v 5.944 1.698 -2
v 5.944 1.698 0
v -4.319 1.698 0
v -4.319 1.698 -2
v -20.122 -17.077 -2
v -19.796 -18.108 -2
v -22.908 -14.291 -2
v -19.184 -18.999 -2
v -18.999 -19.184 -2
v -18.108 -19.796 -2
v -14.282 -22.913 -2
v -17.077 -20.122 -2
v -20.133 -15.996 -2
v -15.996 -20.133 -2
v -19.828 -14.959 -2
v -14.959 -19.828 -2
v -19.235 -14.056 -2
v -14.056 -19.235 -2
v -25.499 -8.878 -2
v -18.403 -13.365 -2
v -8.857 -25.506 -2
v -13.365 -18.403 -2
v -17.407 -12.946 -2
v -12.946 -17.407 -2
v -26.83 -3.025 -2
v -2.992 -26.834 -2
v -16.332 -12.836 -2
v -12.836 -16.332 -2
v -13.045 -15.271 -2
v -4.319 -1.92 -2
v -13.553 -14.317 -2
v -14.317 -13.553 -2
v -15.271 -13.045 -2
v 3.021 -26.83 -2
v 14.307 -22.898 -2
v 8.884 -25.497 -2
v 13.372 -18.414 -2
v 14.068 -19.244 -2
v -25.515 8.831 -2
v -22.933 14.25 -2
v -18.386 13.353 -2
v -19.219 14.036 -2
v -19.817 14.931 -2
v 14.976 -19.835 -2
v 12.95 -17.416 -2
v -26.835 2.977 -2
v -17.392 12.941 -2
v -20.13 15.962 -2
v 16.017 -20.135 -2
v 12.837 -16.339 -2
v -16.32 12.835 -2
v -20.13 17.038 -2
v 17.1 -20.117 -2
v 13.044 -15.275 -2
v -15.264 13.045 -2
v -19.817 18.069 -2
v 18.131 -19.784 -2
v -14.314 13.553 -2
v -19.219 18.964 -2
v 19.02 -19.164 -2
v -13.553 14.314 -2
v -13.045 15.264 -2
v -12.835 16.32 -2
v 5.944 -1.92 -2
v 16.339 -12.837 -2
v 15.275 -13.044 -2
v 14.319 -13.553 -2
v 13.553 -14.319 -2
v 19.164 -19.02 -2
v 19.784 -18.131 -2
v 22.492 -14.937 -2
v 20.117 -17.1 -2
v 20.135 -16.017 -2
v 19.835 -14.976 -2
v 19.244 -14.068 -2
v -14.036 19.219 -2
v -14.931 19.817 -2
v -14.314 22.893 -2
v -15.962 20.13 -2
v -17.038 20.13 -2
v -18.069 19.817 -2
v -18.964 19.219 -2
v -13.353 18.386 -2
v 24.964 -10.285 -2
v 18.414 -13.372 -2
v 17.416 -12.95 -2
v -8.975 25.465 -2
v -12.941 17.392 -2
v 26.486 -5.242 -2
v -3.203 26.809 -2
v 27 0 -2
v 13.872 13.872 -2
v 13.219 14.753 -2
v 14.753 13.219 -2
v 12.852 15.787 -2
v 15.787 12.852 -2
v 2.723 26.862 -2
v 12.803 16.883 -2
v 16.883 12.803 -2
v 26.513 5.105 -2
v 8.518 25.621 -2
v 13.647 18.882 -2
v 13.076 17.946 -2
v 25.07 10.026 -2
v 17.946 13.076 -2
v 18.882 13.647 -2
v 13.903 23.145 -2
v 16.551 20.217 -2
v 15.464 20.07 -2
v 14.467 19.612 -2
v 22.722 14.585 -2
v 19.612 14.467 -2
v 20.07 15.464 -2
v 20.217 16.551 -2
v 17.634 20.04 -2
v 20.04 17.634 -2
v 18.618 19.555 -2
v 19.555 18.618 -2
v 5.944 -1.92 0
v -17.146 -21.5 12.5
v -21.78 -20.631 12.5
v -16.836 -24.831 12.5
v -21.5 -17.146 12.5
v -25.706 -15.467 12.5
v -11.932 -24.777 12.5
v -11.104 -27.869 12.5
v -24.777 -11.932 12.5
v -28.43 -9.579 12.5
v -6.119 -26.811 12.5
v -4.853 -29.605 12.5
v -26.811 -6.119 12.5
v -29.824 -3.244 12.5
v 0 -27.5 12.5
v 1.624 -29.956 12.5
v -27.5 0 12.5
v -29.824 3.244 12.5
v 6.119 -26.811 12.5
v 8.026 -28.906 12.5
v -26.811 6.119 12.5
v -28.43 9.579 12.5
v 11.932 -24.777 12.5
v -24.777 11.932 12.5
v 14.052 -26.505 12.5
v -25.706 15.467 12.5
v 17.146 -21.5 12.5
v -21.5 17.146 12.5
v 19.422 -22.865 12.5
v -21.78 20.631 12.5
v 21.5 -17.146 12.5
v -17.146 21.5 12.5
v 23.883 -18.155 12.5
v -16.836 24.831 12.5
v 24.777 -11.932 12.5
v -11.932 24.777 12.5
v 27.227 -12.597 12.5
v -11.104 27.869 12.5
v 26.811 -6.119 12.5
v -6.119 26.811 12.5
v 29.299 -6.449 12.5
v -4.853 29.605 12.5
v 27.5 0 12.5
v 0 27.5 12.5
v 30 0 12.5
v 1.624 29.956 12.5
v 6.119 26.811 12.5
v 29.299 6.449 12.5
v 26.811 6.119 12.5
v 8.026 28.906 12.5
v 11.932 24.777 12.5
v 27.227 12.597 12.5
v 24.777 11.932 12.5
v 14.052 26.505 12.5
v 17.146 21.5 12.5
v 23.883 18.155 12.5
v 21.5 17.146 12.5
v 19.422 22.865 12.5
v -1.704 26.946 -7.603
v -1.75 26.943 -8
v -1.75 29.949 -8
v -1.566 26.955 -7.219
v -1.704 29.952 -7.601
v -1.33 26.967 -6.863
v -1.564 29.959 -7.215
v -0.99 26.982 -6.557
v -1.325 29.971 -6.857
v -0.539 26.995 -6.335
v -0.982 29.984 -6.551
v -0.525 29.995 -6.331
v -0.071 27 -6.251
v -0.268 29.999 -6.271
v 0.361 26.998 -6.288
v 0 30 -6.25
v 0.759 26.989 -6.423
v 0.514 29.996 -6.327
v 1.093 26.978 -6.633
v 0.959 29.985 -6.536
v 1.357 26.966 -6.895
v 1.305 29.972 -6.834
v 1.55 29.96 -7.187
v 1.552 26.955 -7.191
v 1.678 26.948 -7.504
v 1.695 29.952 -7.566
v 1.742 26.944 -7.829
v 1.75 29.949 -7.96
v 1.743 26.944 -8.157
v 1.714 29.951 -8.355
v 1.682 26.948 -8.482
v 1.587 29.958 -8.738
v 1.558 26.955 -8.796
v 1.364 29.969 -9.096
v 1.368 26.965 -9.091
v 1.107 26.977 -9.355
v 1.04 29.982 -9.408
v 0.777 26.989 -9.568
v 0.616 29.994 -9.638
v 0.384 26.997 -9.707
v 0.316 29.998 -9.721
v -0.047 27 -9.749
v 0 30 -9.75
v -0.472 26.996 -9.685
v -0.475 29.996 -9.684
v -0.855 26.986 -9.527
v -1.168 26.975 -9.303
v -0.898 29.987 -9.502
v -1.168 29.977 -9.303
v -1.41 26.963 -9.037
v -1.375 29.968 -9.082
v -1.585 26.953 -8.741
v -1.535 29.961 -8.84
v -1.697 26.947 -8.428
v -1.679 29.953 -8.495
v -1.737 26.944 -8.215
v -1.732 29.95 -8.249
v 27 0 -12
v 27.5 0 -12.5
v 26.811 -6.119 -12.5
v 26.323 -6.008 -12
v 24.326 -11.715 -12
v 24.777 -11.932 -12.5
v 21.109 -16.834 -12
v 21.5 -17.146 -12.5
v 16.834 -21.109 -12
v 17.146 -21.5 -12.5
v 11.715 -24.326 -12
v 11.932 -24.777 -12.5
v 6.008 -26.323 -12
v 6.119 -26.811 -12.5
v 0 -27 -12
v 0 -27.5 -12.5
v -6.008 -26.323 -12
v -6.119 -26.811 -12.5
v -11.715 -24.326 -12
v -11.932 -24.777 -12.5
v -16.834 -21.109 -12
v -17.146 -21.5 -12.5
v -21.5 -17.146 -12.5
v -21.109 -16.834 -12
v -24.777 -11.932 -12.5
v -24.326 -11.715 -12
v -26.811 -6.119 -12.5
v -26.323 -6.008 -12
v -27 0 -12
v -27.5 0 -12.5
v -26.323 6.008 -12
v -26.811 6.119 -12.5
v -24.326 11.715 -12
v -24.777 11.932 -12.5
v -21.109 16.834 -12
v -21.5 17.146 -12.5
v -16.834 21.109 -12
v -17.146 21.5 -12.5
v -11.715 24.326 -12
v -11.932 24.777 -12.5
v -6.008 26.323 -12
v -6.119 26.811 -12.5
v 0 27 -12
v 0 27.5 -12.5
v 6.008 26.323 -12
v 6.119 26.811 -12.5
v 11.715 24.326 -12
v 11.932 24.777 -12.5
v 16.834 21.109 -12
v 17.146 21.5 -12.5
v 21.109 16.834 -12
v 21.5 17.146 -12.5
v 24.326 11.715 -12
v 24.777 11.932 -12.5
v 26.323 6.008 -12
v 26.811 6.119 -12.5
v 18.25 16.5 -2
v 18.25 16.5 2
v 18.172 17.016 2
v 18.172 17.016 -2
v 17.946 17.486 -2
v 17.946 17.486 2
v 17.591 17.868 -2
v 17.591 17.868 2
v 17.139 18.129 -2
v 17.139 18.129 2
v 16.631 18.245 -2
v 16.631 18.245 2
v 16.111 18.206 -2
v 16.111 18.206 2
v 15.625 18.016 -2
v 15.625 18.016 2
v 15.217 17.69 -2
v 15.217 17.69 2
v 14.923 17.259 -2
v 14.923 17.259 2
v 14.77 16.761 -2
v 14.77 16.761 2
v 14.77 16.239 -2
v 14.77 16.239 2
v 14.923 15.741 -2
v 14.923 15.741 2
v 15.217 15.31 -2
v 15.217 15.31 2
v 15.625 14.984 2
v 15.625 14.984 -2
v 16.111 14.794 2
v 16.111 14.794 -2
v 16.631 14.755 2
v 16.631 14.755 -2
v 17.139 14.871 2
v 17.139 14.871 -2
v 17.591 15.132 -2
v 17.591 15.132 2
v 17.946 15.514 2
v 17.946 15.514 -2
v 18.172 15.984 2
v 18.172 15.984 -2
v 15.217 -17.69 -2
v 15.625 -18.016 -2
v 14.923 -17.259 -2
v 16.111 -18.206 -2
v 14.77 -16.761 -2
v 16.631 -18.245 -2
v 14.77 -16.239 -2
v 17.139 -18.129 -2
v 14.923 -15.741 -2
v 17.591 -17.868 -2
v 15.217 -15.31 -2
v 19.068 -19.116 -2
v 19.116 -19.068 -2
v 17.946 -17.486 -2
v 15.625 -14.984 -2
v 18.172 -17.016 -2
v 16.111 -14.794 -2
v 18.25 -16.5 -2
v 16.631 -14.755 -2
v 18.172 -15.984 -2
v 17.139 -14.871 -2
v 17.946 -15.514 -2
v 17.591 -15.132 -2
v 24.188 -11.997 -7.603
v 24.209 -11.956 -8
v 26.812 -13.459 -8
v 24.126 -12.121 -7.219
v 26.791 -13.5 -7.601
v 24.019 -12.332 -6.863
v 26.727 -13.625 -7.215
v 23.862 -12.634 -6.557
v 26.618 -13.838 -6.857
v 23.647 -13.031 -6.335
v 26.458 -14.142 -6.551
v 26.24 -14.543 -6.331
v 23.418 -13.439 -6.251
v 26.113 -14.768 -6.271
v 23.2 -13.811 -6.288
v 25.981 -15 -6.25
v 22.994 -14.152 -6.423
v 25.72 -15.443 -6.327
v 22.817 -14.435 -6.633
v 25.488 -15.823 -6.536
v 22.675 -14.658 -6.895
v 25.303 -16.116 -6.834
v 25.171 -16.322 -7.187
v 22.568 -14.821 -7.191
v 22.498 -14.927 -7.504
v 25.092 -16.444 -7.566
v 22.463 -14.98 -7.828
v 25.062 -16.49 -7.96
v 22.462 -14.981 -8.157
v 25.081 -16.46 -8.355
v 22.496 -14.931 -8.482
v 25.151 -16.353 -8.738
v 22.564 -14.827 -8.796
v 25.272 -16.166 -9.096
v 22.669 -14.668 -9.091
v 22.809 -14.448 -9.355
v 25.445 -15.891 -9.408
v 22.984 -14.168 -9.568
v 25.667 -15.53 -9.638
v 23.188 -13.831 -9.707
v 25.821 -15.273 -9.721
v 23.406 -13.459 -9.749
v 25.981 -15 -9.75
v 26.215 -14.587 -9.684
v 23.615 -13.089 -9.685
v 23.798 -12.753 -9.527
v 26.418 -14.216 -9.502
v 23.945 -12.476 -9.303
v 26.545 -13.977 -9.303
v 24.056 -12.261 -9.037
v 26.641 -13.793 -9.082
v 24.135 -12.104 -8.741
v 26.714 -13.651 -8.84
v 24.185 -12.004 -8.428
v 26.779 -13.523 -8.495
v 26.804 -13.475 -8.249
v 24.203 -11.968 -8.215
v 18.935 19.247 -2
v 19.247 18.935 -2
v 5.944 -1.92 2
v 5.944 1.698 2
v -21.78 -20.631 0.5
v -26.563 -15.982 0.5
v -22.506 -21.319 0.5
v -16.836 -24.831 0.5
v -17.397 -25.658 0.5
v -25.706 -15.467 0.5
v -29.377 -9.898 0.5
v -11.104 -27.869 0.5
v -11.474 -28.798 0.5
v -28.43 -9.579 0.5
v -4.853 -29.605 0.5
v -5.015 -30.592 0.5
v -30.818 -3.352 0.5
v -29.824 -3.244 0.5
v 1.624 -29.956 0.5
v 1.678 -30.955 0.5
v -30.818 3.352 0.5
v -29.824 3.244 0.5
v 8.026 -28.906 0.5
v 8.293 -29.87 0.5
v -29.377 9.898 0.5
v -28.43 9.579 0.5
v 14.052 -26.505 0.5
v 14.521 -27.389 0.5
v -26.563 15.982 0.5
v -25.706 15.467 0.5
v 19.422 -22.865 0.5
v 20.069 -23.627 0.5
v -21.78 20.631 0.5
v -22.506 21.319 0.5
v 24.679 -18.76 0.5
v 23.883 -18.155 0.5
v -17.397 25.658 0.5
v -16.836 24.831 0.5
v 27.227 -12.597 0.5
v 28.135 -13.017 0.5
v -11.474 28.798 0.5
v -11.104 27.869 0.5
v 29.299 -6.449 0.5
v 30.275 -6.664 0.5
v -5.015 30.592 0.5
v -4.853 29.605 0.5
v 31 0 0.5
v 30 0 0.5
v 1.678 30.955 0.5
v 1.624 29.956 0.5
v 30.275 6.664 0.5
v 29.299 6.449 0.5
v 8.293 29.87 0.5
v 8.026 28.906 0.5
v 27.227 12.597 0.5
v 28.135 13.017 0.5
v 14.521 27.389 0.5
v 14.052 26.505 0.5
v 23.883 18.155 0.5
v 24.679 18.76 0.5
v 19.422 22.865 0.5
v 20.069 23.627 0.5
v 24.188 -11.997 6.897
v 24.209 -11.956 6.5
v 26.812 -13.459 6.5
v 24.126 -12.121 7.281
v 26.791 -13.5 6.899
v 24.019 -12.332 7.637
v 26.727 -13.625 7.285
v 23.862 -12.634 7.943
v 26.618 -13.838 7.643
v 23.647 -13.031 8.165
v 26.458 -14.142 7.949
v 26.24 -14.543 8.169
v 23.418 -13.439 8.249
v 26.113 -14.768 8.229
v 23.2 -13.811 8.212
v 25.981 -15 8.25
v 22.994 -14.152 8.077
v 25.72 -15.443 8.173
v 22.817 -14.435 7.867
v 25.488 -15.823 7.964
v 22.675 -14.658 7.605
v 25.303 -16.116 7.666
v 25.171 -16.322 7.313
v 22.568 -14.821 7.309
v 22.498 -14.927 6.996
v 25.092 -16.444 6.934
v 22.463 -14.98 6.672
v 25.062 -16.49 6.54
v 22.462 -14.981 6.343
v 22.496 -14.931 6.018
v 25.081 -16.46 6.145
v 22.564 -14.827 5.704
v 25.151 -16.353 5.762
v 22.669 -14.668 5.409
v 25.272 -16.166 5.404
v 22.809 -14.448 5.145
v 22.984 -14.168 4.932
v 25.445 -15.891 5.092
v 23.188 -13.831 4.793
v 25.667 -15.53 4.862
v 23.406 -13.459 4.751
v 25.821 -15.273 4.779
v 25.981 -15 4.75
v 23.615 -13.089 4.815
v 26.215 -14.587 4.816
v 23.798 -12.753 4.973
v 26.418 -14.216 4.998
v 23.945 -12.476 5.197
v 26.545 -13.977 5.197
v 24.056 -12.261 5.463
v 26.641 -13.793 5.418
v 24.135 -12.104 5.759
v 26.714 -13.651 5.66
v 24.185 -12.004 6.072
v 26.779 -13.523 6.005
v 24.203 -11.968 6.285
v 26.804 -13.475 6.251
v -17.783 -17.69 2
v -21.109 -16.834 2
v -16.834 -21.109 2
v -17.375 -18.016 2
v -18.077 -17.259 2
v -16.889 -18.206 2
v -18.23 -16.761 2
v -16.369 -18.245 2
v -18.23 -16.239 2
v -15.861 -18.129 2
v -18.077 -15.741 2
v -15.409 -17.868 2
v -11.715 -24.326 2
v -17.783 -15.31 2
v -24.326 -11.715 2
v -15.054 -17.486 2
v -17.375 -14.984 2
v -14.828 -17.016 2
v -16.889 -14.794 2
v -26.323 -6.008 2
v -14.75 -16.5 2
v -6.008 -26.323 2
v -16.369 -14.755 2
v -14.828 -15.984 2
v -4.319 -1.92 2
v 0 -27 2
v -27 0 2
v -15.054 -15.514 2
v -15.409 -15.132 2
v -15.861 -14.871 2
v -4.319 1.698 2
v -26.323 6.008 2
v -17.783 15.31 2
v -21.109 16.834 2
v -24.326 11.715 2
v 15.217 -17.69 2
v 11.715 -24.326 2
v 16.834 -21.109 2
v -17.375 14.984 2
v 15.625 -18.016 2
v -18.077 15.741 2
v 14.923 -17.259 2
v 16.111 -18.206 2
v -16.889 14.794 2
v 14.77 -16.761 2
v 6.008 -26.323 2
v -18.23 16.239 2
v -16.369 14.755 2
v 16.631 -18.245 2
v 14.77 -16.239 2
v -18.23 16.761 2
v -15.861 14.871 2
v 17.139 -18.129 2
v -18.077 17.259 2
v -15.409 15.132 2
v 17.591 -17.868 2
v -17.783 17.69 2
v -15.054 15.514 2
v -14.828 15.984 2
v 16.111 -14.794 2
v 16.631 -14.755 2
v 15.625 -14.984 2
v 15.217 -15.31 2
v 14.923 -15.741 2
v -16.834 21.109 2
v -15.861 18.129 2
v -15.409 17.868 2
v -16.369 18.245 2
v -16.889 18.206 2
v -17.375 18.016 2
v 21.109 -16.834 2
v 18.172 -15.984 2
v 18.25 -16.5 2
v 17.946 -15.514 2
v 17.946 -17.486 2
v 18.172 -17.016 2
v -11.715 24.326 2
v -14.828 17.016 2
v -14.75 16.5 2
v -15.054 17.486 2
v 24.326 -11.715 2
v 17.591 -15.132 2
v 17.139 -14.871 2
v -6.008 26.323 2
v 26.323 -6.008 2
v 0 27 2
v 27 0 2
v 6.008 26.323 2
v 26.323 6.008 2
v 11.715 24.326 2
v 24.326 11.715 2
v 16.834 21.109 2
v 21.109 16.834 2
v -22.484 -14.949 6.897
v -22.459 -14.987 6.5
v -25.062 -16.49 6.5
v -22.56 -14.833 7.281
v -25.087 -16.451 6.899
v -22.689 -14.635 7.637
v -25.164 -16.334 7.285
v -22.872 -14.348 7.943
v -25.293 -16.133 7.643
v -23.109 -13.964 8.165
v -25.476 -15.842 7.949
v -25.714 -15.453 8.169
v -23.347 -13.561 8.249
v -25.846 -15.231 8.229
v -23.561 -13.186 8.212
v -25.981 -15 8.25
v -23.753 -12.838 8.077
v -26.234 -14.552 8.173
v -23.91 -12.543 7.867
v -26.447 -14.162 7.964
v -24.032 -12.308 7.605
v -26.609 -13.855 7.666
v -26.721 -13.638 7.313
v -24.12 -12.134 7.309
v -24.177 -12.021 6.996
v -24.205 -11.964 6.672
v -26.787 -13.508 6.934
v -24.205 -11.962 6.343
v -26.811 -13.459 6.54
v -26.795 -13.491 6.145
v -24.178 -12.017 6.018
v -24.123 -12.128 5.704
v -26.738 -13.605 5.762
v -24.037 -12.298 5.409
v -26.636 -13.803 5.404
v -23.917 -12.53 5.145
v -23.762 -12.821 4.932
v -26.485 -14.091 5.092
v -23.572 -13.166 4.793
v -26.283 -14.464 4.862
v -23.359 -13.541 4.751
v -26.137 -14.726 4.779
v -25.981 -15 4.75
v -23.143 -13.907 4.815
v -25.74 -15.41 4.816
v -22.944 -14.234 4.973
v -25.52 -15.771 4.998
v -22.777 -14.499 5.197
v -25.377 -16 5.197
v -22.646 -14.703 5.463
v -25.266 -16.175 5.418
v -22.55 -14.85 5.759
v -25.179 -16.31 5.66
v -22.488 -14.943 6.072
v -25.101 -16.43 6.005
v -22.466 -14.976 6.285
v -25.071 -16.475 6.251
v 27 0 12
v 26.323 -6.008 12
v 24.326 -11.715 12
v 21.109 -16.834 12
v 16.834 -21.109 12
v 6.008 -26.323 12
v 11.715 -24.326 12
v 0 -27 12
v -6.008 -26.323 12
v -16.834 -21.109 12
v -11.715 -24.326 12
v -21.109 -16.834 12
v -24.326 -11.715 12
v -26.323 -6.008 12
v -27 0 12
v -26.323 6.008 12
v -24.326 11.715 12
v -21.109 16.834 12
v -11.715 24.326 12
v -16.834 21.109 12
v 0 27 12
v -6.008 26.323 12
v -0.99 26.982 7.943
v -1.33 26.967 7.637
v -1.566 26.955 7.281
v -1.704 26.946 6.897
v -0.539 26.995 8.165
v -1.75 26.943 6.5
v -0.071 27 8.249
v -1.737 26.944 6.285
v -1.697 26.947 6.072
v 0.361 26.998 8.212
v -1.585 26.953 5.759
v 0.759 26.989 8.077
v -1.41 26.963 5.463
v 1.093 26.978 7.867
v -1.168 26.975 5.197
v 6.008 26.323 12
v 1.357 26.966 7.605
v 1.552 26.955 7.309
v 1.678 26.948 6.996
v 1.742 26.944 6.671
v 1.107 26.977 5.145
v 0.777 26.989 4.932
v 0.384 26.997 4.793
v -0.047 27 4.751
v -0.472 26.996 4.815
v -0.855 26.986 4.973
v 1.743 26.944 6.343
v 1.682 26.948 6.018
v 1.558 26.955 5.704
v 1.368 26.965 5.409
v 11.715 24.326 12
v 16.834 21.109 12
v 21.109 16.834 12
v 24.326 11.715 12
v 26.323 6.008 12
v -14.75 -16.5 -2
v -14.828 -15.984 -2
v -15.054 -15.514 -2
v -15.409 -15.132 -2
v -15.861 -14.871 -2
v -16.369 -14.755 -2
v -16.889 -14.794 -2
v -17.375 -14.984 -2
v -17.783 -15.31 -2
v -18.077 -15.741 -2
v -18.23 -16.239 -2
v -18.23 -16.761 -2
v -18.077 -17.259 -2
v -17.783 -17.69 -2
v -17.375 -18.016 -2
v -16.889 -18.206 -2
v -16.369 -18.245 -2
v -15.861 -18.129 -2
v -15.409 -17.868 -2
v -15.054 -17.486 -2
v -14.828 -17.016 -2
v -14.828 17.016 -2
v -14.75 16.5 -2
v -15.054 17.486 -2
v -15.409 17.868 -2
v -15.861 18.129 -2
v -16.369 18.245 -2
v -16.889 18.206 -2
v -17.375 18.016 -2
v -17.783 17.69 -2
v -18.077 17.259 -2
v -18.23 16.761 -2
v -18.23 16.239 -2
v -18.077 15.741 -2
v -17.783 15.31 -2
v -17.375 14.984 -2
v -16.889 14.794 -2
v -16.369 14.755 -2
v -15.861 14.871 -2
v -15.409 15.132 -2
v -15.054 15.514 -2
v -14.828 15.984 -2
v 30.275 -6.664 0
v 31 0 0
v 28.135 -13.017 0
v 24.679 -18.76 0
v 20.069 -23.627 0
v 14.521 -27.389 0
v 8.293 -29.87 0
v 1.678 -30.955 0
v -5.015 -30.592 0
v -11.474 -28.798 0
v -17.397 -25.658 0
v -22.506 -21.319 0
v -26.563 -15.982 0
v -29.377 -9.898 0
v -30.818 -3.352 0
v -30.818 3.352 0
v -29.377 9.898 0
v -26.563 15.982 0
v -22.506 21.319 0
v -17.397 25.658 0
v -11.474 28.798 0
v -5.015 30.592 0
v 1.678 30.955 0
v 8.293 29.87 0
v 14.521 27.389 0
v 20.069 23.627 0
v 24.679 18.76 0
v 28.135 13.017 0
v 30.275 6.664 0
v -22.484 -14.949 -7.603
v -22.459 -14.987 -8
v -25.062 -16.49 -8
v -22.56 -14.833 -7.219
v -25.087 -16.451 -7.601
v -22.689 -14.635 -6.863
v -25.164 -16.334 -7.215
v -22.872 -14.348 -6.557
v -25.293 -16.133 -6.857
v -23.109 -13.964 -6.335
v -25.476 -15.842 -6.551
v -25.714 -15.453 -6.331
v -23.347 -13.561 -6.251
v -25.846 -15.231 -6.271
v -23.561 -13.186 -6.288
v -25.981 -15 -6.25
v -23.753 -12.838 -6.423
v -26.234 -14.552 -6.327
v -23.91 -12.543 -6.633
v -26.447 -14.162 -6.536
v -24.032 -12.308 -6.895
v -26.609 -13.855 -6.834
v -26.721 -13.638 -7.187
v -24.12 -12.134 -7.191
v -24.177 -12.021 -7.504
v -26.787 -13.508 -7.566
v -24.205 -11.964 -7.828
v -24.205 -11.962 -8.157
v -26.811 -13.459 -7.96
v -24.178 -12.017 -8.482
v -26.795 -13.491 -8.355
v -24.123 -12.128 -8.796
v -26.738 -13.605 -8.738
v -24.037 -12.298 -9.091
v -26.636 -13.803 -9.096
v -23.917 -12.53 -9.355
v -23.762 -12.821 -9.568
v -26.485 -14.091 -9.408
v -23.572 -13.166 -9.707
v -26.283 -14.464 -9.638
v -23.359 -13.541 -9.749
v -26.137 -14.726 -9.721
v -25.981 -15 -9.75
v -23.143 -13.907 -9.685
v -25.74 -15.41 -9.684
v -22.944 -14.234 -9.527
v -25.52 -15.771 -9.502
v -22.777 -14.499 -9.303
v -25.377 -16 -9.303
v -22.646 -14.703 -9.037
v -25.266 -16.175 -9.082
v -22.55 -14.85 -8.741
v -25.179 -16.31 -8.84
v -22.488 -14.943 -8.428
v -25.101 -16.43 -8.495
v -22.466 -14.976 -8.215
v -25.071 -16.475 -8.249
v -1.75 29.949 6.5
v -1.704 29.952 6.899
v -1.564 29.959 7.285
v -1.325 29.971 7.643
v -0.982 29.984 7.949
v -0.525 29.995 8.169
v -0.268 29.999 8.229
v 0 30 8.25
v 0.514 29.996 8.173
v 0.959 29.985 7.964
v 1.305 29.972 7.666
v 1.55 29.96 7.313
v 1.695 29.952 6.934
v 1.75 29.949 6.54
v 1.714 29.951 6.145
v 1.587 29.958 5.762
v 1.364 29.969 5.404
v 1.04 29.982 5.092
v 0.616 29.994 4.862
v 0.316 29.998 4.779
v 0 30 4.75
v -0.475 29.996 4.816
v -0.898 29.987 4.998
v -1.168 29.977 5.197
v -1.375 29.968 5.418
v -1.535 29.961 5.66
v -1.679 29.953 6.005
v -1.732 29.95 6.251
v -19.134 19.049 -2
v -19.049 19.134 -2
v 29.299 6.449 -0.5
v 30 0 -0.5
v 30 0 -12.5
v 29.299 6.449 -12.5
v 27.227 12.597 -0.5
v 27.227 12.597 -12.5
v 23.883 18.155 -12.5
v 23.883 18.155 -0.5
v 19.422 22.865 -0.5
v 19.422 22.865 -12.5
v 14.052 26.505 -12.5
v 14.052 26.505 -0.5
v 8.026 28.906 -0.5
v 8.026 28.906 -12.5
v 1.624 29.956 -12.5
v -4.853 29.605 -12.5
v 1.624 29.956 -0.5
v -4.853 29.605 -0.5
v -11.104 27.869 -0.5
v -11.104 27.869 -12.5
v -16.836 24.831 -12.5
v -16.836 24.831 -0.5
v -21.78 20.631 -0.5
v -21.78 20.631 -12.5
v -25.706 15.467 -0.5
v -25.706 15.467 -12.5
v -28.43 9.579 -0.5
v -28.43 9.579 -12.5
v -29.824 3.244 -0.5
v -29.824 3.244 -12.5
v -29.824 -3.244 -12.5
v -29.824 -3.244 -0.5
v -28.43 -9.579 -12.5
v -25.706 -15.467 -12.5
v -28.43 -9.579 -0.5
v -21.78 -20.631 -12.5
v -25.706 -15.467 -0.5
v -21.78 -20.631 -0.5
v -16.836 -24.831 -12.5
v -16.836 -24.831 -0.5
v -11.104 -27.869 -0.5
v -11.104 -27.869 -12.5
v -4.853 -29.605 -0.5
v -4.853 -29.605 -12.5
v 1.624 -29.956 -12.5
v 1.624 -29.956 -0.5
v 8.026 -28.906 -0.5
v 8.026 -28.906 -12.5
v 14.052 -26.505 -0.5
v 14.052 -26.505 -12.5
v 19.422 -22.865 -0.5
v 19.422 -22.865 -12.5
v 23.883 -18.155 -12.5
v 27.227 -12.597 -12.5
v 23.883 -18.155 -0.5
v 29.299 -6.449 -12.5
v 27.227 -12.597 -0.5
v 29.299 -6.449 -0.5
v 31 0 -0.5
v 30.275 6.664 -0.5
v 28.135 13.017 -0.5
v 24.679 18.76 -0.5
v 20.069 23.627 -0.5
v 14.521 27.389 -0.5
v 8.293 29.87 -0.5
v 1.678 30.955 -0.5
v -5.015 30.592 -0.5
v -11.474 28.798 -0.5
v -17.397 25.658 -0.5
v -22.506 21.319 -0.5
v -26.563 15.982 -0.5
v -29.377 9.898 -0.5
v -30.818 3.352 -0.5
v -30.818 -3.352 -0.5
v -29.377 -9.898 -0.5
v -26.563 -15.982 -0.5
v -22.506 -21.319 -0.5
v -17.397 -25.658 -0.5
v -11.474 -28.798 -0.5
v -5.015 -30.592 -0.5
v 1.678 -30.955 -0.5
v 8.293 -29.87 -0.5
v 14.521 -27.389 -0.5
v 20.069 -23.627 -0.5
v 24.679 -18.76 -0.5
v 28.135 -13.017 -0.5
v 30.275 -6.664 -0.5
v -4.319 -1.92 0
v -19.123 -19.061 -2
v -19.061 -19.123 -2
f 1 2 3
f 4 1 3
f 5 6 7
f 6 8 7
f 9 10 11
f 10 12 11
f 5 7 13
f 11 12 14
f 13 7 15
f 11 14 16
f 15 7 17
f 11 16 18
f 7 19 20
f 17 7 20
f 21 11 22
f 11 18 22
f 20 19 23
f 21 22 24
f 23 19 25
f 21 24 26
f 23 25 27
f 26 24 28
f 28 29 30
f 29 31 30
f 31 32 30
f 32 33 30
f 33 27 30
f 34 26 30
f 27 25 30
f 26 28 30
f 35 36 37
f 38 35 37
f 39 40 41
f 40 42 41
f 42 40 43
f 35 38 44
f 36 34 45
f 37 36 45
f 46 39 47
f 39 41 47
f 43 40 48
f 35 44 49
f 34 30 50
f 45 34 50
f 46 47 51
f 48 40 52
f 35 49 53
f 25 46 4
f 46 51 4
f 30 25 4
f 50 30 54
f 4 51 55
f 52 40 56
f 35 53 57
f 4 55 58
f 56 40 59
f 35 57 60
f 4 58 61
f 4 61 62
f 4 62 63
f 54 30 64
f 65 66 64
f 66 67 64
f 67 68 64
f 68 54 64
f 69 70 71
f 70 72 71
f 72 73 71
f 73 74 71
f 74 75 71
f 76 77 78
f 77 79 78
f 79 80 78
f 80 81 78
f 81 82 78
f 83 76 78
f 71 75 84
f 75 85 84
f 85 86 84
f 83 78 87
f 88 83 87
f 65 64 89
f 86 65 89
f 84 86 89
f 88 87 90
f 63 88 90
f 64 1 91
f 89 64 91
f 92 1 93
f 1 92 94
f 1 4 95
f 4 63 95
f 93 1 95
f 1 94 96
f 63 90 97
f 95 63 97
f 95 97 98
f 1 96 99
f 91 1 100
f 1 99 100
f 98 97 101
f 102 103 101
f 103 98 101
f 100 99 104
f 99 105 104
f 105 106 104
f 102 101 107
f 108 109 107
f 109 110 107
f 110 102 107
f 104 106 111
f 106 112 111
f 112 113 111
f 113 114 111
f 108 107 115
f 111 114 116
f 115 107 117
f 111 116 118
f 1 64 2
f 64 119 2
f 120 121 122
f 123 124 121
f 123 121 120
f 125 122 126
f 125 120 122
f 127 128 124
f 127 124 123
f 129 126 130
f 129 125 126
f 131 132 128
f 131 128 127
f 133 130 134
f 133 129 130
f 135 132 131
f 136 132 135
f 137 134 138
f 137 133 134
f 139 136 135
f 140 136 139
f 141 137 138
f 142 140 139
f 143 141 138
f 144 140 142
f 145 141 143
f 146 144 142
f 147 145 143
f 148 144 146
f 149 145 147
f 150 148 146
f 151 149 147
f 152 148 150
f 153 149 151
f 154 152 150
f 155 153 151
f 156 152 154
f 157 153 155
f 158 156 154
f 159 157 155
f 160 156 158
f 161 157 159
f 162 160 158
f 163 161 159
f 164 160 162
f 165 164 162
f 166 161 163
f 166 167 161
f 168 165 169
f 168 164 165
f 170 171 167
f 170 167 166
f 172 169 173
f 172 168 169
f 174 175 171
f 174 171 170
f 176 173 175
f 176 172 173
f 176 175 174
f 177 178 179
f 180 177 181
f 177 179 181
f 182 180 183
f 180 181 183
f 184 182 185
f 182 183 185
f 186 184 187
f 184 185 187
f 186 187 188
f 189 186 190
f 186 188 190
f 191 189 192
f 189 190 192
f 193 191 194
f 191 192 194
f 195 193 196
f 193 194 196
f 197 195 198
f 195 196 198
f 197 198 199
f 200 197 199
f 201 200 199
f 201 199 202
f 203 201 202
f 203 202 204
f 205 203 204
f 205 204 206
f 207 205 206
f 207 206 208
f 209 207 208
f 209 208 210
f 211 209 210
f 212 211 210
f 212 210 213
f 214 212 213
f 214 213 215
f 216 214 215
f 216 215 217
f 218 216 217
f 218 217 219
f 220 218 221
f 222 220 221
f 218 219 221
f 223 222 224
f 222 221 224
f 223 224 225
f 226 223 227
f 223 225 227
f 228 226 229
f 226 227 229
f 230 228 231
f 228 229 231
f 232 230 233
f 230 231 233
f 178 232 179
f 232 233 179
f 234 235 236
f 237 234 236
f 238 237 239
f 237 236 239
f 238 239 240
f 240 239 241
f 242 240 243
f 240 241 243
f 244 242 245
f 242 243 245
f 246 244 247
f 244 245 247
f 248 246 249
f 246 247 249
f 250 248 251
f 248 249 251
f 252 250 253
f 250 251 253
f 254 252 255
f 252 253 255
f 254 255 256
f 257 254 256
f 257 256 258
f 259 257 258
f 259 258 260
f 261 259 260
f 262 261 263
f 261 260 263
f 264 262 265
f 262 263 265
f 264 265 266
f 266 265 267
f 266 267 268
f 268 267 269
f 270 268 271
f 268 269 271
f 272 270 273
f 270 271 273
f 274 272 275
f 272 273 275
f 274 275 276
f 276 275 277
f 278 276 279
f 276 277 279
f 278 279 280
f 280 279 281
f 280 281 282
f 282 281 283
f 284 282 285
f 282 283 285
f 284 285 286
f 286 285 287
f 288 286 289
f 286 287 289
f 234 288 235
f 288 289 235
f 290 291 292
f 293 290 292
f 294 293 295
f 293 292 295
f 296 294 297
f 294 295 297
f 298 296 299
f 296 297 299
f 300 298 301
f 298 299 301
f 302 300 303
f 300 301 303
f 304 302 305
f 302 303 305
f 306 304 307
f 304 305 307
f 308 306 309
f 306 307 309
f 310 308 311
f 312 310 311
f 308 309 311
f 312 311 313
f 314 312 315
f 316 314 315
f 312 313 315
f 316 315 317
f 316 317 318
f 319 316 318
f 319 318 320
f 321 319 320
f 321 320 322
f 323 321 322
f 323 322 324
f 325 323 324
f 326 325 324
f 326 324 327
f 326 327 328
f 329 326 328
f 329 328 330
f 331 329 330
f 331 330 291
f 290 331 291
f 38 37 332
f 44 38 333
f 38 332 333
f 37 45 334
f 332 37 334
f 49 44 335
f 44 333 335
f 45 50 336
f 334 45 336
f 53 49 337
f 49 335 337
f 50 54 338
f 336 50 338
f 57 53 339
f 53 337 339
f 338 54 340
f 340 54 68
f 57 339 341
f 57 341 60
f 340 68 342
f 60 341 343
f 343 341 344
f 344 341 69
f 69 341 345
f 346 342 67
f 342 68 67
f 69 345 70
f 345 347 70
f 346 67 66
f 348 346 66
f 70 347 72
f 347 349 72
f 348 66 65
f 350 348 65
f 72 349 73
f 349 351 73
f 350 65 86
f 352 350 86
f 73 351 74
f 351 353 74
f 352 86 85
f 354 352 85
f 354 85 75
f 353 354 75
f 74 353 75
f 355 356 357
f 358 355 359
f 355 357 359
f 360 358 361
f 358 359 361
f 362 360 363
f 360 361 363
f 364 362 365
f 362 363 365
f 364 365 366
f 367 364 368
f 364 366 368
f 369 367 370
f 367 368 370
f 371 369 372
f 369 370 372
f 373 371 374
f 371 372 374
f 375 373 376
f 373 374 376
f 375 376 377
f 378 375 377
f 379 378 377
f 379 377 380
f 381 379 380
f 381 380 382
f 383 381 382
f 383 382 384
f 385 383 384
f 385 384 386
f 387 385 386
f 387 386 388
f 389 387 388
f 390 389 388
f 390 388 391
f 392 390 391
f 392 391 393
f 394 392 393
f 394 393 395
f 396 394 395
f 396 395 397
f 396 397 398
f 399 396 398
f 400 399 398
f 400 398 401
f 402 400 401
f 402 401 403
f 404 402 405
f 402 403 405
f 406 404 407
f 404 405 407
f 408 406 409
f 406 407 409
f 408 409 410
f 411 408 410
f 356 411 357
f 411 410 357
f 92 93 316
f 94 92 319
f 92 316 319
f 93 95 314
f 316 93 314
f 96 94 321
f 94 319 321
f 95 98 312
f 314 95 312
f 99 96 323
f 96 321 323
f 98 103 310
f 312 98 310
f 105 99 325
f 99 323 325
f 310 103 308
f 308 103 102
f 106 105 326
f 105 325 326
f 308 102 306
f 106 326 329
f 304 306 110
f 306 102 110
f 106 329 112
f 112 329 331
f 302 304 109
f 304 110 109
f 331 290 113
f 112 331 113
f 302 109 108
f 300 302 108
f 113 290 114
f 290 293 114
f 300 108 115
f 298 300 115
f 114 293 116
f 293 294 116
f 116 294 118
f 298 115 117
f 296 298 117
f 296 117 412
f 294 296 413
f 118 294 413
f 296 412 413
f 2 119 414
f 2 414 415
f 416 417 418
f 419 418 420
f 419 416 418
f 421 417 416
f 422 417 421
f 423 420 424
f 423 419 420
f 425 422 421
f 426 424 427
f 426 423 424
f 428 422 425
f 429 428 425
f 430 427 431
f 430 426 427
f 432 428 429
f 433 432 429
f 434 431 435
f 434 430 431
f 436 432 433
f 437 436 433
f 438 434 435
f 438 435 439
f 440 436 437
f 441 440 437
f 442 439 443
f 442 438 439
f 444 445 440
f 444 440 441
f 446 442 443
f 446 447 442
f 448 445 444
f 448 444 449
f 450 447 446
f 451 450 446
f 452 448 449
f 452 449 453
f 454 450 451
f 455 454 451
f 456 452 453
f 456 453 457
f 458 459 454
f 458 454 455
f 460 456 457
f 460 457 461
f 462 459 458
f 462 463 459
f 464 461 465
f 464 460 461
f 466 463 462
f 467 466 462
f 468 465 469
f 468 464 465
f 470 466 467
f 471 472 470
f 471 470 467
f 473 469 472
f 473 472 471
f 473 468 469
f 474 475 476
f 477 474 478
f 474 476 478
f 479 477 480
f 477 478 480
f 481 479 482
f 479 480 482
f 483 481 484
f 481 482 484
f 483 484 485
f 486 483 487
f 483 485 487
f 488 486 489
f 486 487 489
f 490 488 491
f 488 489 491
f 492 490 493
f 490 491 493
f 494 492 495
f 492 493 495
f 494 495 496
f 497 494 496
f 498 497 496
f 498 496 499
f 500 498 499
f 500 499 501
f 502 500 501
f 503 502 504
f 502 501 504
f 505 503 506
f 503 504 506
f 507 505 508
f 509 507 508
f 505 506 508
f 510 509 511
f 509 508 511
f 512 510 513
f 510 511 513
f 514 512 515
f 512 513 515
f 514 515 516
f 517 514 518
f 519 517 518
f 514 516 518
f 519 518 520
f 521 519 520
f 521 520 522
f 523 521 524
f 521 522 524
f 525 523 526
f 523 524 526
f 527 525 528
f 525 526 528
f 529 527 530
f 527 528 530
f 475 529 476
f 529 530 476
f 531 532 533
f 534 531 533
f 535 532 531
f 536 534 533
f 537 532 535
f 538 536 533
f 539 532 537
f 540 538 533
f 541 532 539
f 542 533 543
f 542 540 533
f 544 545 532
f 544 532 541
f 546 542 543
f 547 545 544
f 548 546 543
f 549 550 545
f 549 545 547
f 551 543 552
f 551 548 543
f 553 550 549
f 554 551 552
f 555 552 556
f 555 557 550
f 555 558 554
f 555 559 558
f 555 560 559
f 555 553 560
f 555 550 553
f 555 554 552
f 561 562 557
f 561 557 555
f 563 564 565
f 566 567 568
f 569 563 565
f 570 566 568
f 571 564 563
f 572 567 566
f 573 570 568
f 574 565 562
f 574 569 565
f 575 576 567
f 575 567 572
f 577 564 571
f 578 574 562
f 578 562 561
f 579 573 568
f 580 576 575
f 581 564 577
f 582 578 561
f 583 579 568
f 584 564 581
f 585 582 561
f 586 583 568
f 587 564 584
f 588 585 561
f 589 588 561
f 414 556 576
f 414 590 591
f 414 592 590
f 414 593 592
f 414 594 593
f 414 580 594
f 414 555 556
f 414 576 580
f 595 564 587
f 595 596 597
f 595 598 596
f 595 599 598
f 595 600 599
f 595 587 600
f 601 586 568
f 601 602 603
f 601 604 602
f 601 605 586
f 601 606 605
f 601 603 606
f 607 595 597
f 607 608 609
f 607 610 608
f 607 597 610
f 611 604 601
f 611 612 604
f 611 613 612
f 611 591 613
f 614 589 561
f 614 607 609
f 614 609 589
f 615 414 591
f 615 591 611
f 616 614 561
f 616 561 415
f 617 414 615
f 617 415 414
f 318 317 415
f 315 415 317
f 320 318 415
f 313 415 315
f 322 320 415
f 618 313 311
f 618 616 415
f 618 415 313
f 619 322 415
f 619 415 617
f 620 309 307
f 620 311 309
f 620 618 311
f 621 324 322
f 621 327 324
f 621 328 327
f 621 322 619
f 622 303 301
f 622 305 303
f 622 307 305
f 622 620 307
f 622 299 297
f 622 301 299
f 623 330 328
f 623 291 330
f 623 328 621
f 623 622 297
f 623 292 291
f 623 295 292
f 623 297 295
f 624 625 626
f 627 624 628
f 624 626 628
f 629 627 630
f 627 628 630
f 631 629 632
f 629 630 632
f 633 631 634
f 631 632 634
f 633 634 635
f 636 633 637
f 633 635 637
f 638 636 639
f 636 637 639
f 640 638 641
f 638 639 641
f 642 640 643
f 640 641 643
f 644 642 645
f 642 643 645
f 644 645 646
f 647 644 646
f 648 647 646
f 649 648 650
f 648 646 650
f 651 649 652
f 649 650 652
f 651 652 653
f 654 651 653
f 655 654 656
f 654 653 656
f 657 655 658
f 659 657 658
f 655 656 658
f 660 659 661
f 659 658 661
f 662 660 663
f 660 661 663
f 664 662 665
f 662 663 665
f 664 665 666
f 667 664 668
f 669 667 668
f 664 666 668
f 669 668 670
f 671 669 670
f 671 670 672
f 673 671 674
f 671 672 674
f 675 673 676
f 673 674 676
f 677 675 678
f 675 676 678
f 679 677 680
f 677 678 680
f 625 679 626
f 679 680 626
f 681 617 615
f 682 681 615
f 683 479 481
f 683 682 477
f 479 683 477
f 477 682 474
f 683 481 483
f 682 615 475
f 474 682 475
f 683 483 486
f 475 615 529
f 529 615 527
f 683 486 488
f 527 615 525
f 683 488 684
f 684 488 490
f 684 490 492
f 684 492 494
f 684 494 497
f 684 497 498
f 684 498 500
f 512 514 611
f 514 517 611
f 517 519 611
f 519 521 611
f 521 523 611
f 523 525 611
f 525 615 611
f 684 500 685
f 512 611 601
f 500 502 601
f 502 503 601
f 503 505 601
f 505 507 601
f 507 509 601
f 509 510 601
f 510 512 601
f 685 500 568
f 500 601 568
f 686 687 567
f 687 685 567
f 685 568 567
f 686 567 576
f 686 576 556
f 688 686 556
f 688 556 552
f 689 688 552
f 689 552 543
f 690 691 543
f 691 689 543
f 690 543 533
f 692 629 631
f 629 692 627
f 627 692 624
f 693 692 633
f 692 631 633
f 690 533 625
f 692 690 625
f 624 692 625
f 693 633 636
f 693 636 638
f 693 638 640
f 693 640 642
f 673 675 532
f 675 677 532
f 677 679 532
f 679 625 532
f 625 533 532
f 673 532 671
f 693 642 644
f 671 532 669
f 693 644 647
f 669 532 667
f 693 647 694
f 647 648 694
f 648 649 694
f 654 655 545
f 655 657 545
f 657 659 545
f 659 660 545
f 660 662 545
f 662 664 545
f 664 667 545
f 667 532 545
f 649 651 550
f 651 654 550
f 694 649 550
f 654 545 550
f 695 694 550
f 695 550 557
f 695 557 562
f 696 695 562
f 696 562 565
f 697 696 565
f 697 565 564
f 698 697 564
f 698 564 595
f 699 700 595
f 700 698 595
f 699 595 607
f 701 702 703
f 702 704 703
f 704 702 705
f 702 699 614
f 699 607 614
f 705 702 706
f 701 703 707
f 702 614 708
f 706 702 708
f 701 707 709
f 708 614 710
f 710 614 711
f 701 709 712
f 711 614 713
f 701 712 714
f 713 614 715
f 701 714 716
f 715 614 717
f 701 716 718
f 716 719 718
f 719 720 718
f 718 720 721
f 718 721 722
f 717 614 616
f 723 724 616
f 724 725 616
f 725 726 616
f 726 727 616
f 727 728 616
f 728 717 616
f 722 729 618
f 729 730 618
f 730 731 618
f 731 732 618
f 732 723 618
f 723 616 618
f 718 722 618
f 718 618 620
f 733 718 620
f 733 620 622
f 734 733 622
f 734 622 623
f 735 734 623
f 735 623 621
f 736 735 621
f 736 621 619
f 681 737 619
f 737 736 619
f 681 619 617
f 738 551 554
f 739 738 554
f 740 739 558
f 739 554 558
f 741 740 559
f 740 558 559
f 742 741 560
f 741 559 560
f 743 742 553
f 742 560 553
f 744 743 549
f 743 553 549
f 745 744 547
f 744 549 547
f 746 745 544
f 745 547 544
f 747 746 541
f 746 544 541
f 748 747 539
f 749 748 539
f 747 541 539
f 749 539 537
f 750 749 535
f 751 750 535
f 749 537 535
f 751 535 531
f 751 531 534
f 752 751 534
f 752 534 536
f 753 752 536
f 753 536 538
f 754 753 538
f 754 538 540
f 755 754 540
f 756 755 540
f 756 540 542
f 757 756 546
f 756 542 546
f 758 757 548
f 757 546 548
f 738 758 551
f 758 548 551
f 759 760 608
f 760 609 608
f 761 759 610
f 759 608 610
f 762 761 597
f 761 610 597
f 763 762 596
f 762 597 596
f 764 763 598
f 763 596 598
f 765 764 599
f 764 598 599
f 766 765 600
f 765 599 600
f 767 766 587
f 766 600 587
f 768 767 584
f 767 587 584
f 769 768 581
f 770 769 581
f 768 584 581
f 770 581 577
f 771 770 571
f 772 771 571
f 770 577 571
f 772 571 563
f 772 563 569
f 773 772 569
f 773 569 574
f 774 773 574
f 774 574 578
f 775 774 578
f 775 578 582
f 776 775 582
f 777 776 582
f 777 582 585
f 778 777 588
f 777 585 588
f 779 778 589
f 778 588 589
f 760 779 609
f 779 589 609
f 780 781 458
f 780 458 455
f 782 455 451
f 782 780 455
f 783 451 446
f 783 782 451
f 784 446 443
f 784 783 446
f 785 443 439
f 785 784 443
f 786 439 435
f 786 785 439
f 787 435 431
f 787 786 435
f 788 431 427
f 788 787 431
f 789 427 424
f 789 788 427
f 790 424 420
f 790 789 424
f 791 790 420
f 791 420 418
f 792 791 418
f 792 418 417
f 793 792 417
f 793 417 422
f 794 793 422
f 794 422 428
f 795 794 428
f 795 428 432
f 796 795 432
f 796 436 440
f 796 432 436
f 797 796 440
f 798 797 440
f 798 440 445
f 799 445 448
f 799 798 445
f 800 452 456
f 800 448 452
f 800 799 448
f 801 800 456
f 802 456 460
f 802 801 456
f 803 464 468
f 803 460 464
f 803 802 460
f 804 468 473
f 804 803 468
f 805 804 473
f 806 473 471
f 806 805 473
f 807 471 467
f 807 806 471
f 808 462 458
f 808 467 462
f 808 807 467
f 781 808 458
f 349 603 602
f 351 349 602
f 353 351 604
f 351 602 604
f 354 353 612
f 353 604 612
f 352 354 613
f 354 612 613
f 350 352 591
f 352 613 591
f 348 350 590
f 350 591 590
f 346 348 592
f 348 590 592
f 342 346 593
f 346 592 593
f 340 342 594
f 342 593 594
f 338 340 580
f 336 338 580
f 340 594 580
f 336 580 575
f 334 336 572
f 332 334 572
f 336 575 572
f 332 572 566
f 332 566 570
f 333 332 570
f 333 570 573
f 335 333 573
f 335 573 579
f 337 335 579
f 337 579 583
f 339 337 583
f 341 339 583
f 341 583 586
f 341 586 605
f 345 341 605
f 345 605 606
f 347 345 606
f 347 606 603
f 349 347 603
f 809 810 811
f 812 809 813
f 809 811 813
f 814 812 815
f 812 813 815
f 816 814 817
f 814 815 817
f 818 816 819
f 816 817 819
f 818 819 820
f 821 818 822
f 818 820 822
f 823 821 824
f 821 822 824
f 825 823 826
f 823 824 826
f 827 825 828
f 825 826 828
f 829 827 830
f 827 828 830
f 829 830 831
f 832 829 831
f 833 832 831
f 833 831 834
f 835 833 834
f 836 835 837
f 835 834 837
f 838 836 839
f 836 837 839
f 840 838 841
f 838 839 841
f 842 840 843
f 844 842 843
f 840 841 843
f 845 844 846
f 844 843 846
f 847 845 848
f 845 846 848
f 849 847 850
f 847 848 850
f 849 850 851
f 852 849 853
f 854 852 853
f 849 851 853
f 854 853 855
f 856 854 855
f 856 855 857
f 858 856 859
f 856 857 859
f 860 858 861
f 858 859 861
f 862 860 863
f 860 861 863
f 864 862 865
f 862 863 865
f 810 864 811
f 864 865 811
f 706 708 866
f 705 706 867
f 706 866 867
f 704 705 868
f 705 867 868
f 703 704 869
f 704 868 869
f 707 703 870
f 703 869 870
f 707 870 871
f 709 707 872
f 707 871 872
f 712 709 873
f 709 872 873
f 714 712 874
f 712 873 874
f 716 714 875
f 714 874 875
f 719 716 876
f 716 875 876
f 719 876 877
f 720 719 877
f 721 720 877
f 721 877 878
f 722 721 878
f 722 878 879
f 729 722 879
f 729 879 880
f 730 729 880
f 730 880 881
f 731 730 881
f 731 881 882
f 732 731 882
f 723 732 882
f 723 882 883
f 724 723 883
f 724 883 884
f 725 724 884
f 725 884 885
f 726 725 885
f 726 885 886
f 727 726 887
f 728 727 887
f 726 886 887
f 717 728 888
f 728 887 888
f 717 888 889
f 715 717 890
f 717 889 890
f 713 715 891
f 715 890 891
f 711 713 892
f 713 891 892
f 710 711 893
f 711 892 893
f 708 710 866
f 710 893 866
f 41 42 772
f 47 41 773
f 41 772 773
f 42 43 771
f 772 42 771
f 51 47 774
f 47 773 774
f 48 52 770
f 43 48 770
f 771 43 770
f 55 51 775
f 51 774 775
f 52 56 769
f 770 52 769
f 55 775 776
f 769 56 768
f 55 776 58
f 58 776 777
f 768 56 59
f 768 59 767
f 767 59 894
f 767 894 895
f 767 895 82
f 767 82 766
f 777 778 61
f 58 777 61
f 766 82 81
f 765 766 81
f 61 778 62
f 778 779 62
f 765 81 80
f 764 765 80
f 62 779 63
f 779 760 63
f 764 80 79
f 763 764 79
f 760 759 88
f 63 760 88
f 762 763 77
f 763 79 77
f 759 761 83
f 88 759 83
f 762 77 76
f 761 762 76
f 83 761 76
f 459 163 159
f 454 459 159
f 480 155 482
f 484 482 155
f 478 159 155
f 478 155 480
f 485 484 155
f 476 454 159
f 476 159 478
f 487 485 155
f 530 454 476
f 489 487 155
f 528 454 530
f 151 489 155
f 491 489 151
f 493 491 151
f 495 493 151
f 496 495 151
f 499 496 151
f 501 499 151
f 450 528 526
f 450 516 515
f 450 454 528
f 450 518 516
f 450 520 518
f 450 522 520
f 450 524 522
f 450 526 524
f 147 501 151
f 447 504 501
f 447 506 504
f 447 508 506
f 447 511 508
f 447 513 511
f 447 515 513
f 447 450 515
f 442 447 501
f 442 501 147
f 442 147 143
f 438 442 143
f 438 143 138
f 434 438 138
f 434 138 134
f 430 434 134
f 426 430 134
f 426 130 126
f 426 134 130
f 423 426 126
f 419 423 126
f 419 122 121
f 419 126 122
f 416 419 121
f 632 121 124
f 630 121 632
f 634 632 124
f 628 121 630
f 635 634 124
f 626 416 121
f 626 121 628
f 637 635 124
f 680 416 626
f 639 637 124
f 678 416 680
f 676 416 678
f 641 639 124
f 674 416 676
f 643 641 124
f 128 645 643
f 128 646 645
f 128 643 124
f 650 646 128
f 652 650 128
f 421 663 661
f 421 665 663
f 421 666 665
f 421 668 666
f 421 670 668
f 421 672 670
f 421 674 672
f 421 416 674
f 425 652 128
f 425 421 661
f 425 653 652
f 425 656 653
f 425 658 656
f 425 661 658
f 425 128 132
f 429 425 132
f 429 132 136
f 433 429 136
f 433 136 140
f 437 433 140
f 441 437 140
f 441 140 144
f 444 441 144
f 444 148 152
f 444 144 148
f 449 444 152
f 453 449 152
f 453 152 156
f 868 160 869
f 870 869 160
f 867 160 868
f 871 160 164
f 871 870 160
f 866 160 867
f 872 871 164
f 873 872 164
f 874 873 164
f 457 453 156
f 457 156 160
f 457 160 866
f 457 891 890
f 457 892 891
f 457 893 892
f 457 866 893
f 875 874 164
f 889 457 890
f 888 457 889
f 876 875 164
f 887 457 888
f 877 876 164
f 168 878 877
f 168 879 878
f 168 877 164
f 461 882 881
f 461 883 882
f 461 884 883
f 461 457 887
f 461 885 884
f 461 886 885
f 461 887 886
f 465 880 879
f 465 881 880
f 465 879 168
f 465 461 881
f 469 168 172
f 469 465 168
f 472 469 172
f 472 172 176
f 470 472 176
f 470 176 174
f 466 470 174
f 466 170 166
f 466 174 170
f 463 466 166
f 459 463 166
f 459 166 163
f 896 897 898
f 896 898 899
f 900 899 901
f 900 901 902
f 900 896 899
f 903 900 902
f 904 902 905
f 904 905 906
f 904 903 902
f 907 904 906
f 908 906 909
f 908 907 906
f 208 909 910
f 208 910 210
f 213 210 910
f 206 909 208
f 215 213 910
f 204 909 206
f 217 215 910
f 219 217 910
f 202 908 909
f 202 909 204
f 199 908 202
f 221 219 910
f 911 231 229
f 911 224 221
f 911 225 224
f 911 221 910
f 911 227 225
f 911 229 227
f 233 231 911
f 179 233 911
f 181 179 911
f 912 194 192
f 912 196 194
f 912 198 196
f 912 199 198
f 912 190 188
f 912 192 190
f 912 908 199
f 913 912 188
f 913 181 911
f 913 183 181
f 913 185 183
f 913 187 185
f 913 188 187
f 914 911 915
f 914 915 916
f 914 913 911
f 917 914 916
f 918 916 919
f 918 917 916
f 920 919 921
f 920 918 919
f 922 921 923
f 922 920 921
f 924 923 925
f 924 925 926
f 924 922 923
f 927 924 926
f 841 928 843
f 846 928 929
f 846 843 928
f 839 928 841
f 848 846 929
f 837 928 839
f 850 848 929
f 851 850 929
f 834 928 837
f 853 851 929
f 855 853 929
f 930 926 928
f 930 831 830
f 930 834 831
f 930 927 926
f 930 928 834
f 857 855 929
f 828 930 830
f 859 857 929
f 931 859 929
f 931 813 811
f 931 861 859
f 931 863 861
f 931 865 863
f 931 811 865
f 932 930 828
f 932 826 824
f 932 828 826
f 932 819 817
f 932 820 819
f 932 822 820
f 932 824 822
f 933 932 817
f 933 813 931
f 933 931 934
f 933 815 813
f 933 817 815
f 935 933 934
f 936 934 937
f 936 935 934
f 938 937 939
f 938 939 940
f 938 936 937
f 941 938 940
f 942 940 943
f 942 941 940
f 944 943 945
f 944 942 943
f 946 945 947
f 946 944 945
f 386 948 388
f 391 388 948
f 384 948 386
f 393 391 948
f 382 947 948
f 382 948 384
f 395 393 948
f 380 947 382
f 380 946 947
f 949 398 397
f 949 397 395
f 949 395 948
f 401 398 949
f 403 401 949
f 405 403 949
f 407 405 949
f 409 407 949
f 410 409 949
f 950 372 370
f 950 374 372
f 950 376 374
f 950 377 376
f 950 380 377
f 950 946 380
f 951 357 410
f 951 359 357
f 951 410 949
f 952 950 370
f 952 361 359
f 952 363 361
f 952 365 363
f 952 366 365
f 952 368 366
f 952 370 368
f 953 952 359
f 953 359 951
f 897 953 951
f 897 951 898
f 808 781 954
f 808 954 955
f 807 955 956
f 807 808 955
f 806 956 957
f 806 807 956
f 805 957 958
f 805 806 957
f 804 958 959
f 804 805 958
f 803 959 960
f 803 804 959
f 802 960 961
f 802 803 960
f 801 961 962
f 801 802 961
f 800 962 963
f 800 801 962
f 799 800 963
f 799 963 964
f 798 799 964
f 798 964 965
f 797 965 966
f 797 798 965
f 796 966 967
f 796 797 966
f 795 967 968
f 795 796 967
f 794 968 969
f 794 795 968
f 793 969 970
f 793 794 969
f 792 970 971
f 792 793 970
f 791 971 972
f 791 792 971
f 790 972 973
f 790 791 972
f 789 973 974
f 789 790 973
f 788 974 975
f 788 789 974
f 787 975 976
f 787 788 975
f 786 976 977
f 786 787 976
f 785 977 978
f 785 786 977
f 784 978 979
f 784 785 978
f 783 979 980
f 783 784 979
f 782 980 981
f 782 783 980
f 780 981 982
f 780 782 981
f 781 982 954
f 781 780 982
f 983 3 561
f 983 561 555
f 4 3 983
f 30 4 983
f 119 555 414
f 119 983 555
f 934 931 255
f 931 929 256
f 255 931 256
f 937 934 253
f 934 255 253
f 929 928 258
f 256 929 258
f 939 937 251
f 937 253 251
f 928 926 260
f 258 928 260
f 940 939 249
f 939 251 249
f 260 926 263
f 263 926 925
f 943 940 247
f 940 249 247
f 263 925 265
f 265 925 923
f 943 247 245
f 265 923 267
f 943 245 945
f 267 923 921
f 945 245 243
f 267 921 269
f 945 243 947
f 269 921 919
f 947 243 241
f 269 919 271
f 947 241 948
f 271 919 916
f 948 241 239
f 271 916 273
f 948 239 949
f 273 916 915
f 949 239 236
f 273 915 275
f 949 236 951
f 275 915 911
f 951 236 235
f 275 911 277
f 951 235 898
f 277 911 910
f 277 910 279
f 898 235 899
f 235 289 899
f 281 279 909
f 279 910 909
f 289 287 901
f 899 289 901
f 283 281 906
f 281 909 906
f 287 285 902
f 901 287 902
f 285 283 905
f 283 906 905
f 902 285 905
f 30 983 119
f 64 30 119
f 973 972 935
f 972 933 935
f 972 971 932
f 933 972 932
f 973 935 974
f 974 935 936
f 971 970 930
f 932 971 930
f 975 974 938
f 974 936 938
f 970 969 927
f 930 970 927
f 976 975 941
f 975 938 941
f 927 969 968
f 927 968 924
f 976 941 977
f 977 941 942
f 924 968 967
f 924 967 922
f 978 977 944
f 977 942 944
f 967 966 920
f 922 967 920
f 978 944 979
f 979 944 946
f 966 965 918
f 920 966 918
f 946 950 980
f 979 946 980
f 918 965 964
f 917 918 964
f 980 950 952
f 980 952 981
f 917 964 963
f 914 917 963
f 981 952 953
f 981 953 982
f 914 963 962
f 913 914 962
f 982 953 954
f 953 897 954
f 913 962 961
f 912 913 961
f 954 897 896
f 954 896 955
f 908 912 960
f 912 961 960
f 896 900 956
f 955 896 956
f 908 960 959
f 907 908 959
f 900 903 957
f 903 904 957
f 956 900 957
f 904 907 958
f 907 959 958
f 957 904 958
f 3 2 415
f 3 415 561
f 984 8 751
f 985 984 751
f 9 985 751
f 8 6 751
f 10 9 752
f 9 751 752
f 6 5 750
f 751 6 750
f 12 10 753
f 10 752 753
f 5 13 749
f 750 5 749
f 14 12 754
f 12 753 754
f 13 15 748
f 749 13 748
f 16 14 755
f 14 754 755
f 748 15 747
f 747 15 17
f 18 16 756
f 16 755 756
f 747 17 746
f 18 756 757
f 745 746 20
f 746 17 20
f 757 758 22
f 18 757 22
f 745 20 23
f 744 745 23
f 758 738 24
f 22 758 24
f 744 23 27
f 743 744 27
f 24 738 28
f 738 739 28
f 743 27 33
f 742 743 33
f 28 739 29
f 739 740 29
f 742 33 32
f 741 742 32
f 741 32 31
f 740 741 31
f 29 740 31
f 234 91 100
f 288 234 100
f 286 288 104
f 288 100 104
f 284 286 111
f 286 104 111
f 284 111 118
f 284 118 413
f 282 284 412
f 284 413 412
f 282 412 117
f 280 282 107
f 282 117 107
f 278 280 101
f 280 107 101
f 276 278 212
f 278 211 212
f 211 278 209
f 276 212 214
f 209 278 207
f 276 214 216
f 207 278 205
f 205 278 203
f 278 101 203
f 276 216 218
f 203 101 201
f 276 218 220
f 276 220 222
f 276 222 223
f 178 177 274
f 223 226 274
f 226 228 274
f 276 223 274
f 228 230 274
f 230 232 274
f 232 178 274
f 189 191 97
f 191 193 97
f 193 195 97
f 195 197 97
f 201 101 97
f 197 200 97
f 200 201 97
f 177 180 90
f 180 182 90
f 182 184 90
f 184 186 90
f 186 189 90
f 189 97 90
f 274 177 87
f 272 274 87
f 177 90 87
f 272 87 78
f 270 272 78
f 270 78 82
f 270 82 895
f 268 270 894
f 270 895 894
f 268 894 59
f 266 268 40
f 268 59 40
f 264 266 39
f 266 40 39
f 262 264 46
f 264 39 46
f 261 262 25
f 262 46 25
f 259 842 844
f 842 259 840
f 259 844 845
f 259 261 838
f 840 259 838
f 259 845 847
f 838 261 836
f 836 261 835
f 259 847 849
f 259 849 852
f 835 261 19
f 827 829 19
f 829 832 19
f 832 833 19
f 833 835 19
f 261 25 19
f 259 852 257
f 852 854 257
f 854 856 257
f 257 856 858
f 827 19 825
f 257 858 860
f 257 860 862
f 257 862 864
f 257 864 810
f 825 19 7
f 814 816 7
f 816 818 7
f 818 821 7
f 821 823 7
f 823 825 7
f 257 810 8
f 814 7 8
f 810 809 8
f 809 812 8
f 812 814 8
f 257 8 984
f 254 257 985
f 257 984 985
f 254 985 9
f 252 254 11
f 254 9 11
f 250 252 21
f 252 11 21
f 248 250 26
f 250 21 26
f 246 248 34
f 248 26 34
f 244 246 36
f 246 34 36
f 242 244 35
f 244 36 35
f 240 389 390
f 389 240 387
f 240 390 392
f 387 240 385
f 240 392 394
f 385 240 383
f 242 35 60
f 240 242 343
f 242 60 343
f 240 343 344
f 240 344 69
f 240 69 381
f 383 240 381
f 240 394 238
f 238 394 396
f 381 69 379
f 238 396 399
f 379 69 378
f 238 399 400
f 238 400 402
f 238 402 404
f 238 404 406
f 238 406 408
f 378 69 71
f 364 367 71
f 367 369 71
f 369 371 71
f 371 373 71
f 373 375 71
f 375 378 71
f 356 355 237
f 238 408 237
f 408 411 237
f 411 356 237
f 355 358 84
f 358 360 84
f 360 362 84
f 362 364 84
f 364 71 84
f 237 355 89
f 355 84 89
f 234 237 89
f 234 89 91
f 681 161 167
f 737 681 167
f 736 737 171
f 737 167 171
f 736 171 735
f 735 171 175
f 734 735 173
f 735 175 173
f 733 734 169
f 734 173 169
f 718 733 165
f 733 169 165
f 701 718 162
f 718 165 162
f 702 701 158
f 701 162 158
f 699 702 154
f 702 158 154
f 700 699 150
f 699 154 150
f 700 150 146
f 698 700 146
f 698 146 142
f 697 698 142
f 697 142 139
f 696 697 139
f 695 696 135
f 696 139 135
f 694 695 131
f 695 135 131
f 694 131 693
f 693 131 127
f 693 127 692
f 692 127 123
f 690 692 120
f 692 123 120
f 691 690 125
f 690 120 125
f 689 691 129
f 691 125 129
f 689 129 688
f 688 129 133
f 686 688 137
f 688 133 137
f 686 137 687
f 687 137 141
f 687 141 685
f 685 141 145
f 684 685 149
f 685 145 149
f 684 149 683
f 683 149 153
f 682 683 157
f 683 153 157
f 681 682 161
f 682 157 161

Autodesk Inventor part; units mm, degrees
ref_plane "YZ Plane" through (0, 0, 0) normal (1, 0, 0) x (0, 1, 0)
ref_plane "XZ Plane" through (0, 0, 0) normal (0, 1, 0) x (-1, 0, 0)
sketch "Skizze1" plane through (0, 0, 0) normal (0, 0, 1) x (1, 0, 0)
  circle A0 centre (0, 0) radius 30
  circle A1 centre (0, 0) radius 27
  dimension "d0" = 60
  dimension "d1" = 54
extrude "Extrusion1" add sketch "Skizze1" along normal mid plane 25
ref_plane "Arbeitsebene1" through (0, 0, 6) normal (0, 0, 1) x (1, 0, 0)
sketch "Skizze2" plane through (0, 0, 6) normal (0, 0, 1) x (1, 0, 0)
  line L0 (0, 39.0372) -> (0, -37.5893) construction
  circle A0 centre (0, 0) radius 30 construction
  point P0 (0, 30)
ref_plane "Arbeitsebene2" through (0, 30, 6) normal (0, 1, 0) x (-1, 0, 0)
sketch "Skizze3" plane through (0, 30, 6) normal (0, 1, 0) x (-1, 0, 0)
  circle A0 centre (0, 0.5) radius 1.75
  point P0 (0, -6)
  dimension "d5" = 3.5
  dimension "d31" = 6.5
extrude "Extrusion2" cut sketch "Skizze3" against normal blind 5
pattern_circular "Runde Anordnung1" count 3 over 360 about axis through (0, 0, -10) along (0, 0, 1) of "Extrusion2"
chamfer "Fase1" distance 0.5 angle 45 2 edges at (-27, 0, 12.5) (-27, 0, -12.5)
sketch "Skizze5" plane through (0, 0, 0) normal (0, 0, 1) x (1, 0, 0)
  circle A0 centre (0, 0) radius 27
  line L0 (-4.3192, -1.9196) -> (5.9435, -1.9196)
  line L1 (5.9435, -1.9196) -> (5.9435, 1.6981)
  line L2 (5.9435, 1.6981) -> (-4.3192, 1.6981)
  line L3 (-4.3192, 1.6981) -> (-4.3192, -1.9196)
extrude "Extrusion4" add sketch "Skizze5" along normal mid plane 4
sketch "Skizze4" plane through (0, 0, 0) normal (0, 0, 1) x (1, 0, 0)
  line L0 (0, 34.5644) -> (0, -38.5024) construction
  line L1 (-38.0901, 0) -> (52.3904, 0) construction
  line L2 (-34.7368, 16.5) -> (36.624, 16.5) construction
  line L3 (-36.0898, -16.5) -> (37.8594, -16.5) construction
  line L4 (16.5, 35.2115) -> (16.5, -32.6782) construction
  line L5 (-16.5, 34.5644) -> (-16.5, -34.6196) construction
  circle A0 centre (-16.5, 16.5) radius 1.75
  circle A1 centre (16.5, 16.5) radius 1.75
  circle A2 centre (-16.5, -16.5) radius 1.75
  circle A3 centre (16.5, -16.5) radius 1.75
  circle A4 centre (-16.5, 16.5) radius 3.6693
  circle A5 centre (16.5, 16.5) radius 3.7169
  circle A6 centre (16.5, -16.5) radius 3.6667
  circle A7 centre (-16.5, -16.5) radius 3.6675
  point P0 (0, 0)
  dimension "d14" = 33
  dimension "d15" = 33
  dimension "d16" = 3.5
  dimension "d17" = 3.5
  dimension "d18" = 3.5
  dimension "d19" = 3.5
extrude "Extrusion3" add sketch "Skizze4" along normal mid plane 4
extrude "Extrusion5" cut sketch "Skizze4" against normal mid plane 4 contours A0 | A1 | A2 | A3
sketch "Skizze6" plane through (0, 0, 0) normal (0, 0, 1) x (1, 0, 0)
  circle A0 centre (0, 0) radius 31
  circle A1 centre (0, 0) radius 29
  dimension "d27" = 62
  dimension "d28" = 58
extrude "Extrusion6" add sketch "Skizze6" along normal mid plane 1
sketch "Skizze7" plane through (0, 30, 6) normal (0, 1, 0) x (-1, 0, 0)
  circle A0 centre (0, -14) radius 1.75
  point P0 (0, -6)
  dimension "d32" = 3.5
  dimension "d33" = 8
extrude "Extrusion7" cut sketch "Skizze7" against normal blind 5
pattern_circular "Runde Anordnung2" count 3 over 360 about axis through (0, 0, -10) along (0, 0, 1) of "Extrusion7"
properties part number "_3D-Druck"
